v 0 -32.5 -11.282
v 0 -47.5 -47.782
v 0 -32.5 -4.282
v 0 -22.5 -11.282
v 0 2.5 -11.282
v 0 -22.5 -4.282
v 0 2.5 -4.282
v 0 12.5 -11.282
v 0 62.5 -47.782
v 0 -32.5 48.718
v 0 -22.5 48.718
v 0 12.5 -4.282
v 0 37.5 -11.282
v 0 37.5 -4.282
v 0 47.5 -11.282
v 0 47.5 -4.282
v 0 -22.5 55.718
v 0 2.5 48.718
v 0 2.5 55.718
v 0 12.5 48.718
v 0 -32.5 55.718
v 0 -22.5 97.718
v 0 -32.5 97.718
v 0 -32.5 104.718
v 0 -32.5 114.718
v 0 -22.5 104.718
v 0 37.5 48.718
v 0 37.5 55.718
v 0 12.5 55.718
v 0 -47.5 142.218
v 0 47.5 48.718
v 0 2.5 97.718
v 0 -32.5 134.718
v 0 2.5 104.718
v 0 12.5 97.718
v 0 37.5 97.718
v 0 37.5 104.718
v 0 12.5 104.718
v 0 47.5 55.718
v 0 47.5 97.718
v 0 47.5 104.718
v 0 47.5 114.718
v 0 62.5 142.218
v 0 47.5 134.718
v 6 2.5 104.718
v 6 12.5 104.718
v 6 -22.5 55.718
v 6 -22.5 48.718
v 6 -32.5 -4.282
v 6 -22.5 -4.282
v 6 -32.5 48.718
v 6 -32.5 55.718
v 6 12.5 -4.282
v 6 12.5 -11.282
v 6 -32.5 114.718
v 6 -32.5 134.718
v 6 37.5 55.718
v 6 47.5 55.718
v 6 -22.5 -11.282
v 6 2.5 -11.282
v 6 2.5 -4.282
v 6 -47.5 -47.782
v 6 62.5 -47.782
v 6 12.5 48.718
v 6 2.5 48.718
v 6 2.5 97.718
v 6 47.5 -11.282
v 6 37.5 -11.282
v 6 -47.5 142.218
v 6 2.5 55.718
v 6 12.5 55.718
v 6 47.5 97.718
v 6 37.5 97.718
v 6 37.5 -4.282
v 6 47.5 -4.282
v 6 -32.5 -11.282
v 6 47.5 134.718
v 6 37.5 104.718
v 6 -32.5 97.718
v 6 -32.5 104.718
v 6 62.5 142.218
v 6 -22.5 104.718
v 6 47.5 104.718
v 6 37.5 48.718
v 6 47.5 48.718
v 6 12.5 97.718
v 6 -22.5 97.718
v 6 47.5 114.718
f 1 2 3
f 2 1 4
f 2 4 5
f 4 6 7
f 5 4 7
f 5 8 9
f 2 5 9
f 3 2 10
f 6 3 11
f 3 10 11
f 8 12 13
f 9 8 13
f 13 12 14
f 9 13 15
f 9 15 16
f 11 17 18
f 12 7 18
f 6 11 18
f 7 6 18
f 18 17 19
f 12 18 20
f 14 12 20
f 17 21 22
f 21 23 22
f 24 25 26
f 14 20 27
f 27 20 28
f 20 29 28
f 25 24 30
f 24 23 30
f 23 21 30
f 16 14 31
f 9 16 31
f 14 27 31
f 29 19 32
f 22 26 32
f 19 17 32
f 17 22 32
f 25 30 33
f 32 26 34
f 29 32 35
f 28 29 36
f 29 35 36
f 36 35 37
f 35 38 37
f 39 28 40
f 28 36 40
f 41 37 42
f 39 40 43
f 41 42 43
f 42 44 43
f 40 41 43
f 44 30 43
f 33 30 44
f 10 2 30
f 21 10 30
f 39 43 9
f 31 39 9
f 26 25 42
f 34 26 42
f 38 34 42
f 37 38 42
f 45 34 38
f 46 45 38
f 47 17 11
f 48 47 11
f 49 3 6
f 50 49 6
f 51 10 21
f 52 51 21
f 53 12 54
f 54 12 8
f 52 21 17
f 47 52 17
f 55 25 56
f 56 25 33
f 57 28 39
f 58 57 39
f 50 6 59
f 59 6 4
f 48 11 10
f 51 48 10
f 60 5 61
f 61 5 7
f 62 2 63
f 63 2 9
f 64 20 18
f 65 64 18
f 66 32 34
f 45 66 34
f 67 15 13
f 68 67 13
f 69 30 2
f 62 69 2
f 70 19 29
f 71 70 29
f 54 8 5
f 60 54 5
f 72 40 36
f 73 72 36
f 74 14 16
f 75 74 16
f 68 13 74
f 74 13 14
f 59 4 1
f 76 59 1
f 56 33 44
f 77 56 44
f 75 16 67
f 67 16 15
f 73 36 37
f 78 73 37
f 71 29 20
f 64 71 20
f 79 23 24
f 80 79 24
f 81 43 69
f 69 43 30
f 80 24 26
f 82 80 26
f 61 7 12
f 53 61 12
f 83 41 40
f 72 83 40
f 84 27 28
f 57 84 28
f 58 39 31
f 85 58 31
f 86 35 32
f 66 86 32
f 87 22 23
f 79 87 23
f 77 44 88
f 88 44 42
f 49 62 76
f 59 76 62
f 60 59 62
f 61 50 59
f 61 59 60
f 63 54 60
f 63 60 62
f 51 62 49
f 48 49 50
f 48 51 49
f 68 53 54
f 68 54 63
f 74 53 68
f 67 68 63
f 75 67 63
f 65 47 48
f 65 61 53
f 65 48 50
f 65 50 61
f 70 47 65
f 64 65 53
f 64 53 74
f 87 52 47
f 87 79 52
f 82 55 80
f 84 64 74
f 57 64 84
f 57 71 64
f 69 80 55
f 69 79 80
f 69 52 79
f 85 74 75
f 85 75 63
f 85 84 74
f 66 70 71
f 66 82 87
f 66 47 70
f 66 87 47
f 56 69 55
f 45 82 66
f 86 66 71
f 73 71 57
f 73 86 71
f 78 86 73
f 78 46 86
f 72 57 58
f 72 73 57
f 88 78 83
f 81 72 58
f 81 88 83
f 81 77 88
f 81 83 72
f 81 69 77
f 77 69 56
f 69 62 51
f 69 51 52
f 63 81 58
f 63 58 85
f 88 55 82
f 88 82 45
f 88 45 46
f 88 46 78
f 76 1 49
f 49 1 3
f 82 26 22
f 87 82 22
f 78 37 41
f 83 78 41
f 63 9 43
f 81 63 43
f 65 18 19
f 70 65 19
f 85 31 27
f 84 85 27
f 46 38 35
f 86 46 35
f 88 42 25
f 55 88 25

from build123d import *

# Parameters (mm, degrees)
F1_DEPTH = 6


with BuildPart() as f1:
    # F0 (on Right) → F1 (new body)
    with BuildSketch(Plane.YZ):
        Polygon((62.5, 142.2184194922), (9.4337919727, 142.2184194922), (9.4337919727, 134.7184194922), (47.5, 134.7184194922), (47.5, 129.8368871212), (62.5, 129.8368871212), align=None)
        Polygon((9.4337919727, 142.2184194922), (-47.5, 142.2184194922), (-47.5, -47.7815805078), (62.5, -47.7815805078), (62.5, 129.8368871212), (47.5, 129.8368871212), (47.5, 114.7184194922), (-32.5, 114.7184194922), (-32.5, 134.7184194922), (9.4337919727, 134.7184194922), align=None)
        Polygon((-22.5, -4.2815805078), (-22.5, -7.7815805078), (-22.5, -11.2815805078), (-32.5, -11.2815805078), (-32.5, -4.2815805078), align=None, mode=Mode.SUBTRACT)
        Polygon((12.5, -4.2815805078), (12.5, -7.7815805078), (12.5, -11.2815805078), (2.5, -11.2815805078), (2.5, -7.7815805078), (2.5, -4.2815805078), align=None, mode=Mode.SUBTRACT)
        Polygon((37.5, -7.7815805078), (37.5, -4.2815805078), (47.5, -4.2815805078), (47.5, -11.2815805078), (37.5, -11.2815805078), align=None, mode=Mode.SUBTRACT)
        Polygon((-22.5, 55.7184194922), (-22.5, 52.2184194922), (-22.5, 48.7184194922), (-32.5, 48.7184194922), (-32.5, 55.7184194922), align=None, mode=Mode.SUBTRACT)
        Polygon((-22.5, 101.2184194922), (-22.5, 97.7184194922), (-32.5, 97.7184194922), (-32.5, 104.7184194922), (-22.5, 104.7184194922), align=None, mode=Mode.SUBTRACT)
        Polygon((12.5, 55.7184194922), (12.5, 52.2184194922), (12.5, 48.7184194922), (2.5, 48.7184194922), (2.5, 52.2184194922), (2.5, 55.7184194922), align=None, mode=Mode.SUBTRACT)
        Polygon((37.5, 52.2184194922), (37.5, 55.7184194922), (47.5, 55.7184194922), (47.5, 48.7184194922), (37.5, 48.7184194922), align=None, mode=Mode.SUBTRACT)
        Polygon((2.5, 97.7184194922), (2.5, 101.2184194922), (2.5, 104.7184194922), (12.5, 104.7184194922), (12.5, 101.2184194922), (12.5, 97.7184194922), align=None, mode=Mode.SUBTRACT)
        Polygon((37.5, 97.7184194922), (37.5, 101.2184194922), (37.5, 104.7184194922), (47.5, 104.7184194922), (47.5, 97.7184194922), align=None, mode=Mode.SUBTRACT)
    extrude(amount=F1_DEPTH)


solid = f1.part
